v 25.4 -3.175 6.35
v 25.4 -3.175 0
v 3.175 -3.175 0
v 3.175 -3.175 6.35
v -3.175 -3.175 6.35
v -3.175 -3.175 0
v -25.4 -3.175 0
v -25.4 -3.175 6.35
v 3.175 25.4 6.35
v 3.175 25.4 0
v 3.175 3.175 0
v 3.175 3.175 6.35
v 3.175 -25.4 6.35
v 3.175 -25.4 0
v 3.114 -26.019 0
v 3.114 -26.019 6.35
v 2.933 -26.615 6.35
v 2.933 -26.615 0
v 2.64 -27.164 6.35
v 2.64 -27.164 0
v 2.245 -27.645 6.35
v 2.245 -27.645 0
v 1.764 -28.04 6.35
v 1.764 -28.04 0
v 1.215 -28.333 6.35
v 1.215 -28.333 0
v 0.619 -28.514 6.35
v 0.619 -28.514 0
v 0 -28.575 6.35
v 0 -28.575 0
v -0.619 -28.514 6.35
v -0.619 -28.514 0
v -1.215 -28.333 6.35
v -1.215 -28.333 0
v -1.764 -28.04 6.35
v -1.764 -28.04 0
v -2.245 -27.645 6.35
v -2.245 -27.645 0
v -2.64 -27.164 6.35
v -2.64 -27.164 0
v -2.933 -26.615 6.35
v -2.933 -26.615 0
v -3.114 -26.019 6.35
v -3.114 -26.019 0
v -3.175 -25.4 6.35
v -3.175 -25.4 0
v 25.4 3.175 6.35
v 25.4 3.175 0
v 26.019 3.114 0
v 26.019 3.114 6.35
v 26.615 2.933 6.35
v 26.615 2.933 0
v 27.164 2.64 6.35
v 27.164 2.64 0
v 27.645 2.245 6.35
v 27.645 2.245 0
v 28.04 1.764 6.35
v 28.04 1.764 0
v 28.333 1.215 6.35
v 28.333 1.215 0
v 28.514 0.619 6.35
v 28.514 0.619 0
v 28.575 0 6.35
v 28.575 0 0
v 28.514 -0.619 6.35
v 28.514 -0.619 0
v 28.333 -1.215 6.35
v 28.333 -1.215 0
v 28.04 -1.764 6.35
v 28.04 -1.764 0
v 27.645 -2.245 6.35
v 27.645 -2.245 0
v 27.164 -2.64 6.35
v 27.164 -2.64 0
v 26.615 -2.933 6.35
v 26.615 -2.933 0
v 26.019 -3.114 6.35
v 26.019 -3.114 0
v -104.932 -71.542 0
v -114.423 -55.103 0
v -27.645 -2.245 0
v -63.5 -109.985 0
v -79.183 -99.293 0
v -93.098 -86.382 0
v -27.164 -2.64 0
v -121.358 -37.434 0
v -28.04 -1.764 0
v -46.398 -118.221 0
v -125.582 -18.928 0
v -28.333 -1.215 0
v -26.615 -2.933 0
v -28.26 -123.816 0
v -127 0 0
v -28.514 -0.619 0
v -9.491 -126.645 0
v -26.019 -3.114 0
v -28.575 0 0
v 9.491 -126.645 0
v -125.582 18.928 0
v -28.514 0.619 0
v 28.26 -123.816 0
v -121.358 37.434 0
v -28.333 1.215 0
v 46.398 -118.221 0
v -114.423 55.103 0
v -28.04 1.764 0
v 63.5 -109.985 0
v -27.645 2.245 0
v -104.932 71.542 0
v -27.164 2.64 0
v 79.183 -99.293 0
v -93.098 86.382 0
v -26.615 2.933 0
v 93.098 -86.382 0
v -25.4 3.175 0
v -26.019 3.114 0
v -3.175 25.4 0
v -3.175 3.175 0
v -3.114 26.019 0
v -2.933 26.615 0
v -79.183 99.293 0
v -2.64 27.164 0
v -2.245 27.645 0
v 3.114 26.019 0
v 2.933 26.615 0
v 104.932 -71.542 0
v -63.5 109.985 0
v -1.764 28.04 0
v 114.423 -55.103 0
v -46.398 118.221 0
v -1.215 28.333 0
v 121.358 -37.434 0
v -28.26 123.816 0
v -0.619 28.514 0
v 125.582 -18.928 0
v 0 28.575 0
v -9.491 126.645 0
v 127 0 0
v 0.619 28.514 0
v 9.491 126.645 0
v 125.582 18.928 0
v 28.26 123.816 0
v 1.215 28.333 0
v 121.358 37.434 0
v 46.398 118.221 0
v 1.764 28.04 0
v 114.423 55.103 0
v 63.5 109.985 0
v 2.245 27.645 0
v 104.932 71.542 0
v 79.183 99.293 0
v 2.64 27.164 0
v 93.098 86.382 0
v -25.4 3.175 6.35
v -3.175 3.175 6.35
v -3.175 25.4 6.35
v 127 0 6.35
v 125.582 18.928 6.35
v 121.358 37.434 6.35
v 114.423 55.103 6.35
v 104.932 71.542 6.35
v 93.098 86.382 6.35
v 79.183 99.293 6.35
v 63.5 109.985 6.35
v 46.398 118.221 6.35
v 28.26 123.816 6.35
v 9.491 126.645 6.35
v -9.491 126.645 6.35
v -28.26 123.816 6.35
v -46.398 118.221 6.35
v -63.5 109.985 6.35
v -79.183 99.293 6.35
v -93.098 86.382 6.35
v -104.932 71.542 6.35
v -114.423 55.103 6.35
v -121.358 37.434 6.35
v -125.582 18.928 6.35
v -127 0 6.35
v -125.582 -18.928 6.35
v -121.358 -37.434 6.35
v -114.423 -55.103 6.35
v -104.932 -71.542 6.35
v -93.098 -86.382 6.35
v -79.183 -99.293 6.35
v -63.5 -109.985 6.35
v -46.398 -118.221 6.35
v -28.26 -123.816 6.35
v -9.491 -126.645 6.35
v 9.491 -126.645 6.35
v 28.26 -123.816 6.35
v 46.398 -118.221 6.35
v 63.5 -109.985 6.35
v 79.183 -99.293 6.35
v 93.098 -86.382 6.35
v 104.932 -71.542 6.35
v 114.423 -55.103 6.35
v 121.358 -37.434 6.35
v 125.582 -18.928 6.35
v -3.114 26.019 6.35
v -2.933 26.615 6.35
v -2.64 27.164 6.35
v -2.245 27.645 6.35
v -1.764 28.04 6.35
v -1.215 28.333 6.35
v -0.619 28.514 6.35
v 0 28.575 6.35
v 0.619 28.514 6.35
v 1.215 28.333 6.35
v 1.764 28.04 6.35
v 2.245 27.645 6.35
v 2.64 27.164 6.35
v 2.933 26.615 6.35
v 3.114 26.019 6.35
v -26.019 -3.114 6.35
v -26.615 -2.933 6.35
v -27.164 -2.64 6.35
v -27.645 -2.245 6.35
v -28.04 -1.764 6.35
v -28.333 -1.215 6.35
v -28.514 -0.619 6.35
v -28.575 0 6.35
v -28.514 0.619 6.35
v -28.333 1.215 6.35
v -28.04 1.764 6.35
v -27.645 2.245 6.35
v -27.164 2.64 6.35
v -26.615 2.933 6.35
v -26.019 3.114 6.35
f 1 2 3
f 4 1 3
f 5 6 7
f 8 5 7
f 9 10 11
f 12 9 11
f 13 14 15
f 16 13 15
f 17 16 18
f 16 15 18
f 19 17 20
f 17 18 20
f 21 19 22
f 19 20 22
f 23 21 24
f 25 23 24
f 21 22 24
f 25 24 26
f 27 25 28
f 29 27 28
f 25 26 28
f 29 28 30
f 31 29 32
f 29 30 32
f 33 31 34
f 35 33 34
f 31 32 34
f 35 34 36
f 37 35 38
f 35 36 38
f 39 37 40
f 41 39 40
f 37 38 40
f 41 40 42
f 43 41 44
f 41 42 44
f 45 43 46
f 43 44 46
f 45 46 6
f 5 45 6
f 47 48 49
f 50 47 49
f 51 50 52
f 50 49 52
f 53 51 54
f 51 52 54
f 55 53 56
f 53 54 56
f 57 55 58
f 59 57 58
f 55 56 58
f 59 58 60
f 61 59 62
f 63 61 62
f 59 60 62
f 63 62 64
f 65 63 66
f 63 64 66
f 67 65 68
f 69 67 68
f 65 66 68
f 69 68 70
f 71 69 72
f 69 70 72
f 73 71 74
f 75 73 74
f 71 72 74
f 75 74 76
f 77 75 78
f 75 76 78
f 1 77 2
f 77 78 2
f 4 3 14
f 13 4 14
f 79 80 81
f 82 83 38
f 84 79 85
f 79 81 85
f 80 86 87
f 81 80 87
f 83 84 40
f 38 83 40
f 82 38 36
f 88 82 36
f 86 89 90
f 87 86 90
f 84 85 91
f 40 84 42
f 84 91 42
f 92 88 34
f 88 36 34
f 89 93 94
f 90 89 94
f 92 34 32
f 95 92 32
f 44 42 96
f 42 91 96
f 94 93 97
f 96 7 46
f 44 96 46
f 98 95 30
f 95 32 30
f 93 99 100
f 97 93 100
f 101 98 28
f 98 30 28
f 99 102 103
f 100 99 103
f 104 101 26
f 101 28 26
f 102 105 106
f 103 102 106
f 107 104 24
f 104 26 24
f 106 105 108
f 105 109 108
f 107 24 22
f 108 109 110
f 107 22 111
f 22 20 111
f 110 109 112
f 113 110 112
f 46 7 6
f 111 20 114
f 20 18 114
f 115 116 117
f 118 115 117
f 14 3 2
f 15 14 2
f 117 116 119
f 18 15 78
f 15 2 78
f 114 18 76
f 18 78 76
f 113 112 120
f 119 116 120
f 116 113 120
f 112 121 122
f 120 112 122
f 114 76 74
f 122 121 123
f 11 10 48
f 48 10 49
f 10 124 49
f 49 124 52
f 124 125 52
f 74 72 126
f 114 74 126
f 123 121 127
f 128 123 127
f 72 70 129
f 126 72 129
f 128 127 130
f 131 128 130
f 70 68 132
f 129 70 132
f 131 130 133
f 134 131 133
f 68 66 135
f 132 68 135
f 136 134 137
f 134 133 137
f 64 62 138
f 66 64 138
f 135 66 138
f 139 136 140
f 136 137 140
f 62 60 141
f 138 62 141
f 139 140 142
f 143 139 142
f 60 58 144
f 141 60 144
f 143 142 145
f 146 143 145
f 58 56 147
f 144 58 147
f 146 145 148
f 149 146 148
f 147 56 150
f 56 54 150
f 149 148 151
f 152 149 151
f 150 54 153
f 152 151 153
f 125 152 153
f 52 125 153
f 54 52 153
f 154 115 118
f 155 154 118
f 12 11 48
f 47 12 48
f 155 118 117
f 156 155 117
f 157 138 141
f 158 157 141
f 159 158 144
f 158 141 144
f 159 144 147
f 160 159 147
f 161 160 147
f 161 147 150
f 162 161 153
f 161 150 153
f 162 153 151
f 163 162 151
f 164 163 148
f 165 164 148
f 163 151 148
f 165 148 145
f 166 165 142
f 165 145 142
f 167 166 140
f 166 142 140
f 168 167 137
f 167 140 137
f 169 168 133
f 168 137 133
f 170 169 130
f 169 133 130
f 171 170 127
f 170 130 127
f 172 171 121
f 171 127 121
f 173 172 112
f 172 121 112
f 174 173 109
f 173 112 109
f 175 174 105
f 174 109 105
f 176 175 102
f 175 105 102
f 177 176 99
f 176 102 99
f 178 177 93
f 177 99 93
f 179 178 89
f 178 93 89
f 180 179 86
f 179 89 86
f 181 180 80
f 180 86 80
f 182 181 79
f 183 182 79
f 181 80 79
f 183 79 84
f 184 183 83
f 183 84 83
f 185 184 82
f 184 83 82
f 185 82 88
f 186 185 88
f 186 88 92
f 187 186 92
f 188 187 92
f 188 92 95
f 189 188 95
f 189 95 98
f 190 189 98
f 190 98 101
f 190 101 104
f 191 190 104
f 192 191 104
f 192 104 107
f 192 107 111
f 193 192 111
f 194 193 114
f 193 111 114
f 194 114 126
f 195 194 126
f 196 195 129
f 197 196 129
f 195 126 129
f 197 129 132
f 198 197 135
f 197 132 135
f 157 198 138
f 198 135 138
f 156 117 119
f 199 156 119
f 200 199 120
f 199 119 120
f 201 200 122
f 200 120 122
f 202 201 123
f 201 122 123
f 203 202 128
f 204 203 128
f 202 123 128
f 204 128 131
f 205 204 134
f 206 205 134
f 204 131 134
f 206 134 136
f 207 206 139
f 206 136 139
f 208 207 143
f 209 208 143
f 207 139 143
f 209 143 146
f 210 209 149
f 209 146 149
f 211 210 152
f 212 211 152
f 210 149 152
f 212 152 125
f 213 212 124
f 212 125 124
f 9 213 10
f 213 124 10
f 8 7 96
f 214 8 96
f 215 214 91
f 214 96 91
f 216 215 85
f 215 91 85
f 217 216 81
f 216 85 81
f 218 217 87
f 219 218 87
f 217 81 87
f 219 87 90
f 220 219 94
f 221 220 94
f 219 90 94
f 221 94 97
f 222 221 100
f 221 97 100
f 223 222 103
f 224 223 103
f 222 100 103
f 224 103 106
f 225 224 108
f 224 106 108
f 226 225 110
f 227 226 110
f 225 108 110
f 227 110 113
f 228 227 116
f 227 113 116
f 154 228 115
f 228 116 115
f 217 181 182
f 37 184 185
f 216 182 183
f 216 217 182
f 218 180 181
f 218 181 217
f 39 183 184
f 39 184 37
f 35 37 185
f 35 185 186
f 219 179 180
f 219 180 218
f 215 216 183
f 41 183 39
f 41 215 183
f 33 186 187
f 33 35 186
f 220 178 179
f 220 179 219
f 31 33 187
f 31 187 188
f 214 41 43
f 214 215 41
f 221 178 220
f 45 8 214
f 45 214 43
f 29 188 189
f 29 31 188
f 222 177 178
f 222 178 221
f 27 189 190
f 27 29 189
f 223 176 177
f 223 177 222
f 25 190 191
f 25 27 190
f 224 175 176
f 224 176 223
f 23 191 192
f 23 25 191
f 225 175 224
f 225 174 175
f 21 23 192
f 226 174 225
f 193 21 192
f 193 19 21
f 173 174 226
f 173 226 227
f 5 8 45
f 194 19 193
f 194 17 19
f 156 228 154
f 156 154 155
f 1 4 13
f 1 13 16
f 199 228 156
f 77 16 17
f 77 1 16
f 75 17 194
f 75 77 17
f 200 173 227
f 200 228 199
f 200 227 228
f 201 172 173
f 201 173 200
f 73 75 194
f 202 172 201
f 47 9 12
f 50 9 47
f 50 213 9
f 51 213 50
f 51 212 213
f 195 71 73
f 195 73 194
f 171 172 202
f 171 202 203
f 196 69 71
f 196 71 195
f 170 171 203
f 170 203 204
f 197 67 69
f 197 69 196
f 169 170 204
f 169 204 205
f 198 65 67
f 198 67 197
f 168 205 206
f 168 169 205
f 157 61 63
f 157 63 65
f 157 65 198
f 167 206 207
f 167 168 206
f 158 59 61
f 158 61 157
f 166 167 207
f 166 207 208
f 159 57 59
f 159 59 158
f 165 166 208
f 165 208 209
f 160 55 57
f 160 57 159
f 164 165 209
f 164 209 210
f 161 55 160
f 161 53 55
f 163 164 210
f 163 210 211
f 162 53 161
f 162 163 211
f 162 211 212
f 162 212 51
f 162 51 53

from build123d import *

# Parameters (mm, degrees)
F0_R     = 127
F1_DEPTH = 6.35


with BuildPart() as f1:
    # F0 (on Top) → F1 (new body)
    with BuildSketch(Plane.XY):
        Circle(F0_R)
        with BuildLine():
            Line((-3.175, -25.4), (-3.175, -3.175))
            Line((-3.175, -3.175), (-25.4, -3.175))
            ThreePointArc((-25.4, -3.175), (-28.575, 0), (-25.4, 3.175))
            Line((-25.4, 3.175), (-3.175, 3.175))
            Line((-3.175, 3.175), (-3.175, 25.4))
            ThreePointArc((-3.175, 25.4), (0, 28.575), (3.175, 25.4))
            Line((3.175, 25.4), (3.175, 3.175))
            Line((3.175, 3.175), (25.4, 3.175))
            ThreePointArc((25.4, 3.175), (28.575, 0), (25.4, -3.175))
            Line((25.4, -3.175), (3.175, -3.175))
            Line((3.175, -3.175), (3.175, -25.4))
            ThreePointArc((3.175, -25.4), (0, -28.575), (-3.175, -25.4))
        make_face(mode=Mode.SUBTRACT)
    extrude(amount=F1_DEPTH)


solid = f1.part
